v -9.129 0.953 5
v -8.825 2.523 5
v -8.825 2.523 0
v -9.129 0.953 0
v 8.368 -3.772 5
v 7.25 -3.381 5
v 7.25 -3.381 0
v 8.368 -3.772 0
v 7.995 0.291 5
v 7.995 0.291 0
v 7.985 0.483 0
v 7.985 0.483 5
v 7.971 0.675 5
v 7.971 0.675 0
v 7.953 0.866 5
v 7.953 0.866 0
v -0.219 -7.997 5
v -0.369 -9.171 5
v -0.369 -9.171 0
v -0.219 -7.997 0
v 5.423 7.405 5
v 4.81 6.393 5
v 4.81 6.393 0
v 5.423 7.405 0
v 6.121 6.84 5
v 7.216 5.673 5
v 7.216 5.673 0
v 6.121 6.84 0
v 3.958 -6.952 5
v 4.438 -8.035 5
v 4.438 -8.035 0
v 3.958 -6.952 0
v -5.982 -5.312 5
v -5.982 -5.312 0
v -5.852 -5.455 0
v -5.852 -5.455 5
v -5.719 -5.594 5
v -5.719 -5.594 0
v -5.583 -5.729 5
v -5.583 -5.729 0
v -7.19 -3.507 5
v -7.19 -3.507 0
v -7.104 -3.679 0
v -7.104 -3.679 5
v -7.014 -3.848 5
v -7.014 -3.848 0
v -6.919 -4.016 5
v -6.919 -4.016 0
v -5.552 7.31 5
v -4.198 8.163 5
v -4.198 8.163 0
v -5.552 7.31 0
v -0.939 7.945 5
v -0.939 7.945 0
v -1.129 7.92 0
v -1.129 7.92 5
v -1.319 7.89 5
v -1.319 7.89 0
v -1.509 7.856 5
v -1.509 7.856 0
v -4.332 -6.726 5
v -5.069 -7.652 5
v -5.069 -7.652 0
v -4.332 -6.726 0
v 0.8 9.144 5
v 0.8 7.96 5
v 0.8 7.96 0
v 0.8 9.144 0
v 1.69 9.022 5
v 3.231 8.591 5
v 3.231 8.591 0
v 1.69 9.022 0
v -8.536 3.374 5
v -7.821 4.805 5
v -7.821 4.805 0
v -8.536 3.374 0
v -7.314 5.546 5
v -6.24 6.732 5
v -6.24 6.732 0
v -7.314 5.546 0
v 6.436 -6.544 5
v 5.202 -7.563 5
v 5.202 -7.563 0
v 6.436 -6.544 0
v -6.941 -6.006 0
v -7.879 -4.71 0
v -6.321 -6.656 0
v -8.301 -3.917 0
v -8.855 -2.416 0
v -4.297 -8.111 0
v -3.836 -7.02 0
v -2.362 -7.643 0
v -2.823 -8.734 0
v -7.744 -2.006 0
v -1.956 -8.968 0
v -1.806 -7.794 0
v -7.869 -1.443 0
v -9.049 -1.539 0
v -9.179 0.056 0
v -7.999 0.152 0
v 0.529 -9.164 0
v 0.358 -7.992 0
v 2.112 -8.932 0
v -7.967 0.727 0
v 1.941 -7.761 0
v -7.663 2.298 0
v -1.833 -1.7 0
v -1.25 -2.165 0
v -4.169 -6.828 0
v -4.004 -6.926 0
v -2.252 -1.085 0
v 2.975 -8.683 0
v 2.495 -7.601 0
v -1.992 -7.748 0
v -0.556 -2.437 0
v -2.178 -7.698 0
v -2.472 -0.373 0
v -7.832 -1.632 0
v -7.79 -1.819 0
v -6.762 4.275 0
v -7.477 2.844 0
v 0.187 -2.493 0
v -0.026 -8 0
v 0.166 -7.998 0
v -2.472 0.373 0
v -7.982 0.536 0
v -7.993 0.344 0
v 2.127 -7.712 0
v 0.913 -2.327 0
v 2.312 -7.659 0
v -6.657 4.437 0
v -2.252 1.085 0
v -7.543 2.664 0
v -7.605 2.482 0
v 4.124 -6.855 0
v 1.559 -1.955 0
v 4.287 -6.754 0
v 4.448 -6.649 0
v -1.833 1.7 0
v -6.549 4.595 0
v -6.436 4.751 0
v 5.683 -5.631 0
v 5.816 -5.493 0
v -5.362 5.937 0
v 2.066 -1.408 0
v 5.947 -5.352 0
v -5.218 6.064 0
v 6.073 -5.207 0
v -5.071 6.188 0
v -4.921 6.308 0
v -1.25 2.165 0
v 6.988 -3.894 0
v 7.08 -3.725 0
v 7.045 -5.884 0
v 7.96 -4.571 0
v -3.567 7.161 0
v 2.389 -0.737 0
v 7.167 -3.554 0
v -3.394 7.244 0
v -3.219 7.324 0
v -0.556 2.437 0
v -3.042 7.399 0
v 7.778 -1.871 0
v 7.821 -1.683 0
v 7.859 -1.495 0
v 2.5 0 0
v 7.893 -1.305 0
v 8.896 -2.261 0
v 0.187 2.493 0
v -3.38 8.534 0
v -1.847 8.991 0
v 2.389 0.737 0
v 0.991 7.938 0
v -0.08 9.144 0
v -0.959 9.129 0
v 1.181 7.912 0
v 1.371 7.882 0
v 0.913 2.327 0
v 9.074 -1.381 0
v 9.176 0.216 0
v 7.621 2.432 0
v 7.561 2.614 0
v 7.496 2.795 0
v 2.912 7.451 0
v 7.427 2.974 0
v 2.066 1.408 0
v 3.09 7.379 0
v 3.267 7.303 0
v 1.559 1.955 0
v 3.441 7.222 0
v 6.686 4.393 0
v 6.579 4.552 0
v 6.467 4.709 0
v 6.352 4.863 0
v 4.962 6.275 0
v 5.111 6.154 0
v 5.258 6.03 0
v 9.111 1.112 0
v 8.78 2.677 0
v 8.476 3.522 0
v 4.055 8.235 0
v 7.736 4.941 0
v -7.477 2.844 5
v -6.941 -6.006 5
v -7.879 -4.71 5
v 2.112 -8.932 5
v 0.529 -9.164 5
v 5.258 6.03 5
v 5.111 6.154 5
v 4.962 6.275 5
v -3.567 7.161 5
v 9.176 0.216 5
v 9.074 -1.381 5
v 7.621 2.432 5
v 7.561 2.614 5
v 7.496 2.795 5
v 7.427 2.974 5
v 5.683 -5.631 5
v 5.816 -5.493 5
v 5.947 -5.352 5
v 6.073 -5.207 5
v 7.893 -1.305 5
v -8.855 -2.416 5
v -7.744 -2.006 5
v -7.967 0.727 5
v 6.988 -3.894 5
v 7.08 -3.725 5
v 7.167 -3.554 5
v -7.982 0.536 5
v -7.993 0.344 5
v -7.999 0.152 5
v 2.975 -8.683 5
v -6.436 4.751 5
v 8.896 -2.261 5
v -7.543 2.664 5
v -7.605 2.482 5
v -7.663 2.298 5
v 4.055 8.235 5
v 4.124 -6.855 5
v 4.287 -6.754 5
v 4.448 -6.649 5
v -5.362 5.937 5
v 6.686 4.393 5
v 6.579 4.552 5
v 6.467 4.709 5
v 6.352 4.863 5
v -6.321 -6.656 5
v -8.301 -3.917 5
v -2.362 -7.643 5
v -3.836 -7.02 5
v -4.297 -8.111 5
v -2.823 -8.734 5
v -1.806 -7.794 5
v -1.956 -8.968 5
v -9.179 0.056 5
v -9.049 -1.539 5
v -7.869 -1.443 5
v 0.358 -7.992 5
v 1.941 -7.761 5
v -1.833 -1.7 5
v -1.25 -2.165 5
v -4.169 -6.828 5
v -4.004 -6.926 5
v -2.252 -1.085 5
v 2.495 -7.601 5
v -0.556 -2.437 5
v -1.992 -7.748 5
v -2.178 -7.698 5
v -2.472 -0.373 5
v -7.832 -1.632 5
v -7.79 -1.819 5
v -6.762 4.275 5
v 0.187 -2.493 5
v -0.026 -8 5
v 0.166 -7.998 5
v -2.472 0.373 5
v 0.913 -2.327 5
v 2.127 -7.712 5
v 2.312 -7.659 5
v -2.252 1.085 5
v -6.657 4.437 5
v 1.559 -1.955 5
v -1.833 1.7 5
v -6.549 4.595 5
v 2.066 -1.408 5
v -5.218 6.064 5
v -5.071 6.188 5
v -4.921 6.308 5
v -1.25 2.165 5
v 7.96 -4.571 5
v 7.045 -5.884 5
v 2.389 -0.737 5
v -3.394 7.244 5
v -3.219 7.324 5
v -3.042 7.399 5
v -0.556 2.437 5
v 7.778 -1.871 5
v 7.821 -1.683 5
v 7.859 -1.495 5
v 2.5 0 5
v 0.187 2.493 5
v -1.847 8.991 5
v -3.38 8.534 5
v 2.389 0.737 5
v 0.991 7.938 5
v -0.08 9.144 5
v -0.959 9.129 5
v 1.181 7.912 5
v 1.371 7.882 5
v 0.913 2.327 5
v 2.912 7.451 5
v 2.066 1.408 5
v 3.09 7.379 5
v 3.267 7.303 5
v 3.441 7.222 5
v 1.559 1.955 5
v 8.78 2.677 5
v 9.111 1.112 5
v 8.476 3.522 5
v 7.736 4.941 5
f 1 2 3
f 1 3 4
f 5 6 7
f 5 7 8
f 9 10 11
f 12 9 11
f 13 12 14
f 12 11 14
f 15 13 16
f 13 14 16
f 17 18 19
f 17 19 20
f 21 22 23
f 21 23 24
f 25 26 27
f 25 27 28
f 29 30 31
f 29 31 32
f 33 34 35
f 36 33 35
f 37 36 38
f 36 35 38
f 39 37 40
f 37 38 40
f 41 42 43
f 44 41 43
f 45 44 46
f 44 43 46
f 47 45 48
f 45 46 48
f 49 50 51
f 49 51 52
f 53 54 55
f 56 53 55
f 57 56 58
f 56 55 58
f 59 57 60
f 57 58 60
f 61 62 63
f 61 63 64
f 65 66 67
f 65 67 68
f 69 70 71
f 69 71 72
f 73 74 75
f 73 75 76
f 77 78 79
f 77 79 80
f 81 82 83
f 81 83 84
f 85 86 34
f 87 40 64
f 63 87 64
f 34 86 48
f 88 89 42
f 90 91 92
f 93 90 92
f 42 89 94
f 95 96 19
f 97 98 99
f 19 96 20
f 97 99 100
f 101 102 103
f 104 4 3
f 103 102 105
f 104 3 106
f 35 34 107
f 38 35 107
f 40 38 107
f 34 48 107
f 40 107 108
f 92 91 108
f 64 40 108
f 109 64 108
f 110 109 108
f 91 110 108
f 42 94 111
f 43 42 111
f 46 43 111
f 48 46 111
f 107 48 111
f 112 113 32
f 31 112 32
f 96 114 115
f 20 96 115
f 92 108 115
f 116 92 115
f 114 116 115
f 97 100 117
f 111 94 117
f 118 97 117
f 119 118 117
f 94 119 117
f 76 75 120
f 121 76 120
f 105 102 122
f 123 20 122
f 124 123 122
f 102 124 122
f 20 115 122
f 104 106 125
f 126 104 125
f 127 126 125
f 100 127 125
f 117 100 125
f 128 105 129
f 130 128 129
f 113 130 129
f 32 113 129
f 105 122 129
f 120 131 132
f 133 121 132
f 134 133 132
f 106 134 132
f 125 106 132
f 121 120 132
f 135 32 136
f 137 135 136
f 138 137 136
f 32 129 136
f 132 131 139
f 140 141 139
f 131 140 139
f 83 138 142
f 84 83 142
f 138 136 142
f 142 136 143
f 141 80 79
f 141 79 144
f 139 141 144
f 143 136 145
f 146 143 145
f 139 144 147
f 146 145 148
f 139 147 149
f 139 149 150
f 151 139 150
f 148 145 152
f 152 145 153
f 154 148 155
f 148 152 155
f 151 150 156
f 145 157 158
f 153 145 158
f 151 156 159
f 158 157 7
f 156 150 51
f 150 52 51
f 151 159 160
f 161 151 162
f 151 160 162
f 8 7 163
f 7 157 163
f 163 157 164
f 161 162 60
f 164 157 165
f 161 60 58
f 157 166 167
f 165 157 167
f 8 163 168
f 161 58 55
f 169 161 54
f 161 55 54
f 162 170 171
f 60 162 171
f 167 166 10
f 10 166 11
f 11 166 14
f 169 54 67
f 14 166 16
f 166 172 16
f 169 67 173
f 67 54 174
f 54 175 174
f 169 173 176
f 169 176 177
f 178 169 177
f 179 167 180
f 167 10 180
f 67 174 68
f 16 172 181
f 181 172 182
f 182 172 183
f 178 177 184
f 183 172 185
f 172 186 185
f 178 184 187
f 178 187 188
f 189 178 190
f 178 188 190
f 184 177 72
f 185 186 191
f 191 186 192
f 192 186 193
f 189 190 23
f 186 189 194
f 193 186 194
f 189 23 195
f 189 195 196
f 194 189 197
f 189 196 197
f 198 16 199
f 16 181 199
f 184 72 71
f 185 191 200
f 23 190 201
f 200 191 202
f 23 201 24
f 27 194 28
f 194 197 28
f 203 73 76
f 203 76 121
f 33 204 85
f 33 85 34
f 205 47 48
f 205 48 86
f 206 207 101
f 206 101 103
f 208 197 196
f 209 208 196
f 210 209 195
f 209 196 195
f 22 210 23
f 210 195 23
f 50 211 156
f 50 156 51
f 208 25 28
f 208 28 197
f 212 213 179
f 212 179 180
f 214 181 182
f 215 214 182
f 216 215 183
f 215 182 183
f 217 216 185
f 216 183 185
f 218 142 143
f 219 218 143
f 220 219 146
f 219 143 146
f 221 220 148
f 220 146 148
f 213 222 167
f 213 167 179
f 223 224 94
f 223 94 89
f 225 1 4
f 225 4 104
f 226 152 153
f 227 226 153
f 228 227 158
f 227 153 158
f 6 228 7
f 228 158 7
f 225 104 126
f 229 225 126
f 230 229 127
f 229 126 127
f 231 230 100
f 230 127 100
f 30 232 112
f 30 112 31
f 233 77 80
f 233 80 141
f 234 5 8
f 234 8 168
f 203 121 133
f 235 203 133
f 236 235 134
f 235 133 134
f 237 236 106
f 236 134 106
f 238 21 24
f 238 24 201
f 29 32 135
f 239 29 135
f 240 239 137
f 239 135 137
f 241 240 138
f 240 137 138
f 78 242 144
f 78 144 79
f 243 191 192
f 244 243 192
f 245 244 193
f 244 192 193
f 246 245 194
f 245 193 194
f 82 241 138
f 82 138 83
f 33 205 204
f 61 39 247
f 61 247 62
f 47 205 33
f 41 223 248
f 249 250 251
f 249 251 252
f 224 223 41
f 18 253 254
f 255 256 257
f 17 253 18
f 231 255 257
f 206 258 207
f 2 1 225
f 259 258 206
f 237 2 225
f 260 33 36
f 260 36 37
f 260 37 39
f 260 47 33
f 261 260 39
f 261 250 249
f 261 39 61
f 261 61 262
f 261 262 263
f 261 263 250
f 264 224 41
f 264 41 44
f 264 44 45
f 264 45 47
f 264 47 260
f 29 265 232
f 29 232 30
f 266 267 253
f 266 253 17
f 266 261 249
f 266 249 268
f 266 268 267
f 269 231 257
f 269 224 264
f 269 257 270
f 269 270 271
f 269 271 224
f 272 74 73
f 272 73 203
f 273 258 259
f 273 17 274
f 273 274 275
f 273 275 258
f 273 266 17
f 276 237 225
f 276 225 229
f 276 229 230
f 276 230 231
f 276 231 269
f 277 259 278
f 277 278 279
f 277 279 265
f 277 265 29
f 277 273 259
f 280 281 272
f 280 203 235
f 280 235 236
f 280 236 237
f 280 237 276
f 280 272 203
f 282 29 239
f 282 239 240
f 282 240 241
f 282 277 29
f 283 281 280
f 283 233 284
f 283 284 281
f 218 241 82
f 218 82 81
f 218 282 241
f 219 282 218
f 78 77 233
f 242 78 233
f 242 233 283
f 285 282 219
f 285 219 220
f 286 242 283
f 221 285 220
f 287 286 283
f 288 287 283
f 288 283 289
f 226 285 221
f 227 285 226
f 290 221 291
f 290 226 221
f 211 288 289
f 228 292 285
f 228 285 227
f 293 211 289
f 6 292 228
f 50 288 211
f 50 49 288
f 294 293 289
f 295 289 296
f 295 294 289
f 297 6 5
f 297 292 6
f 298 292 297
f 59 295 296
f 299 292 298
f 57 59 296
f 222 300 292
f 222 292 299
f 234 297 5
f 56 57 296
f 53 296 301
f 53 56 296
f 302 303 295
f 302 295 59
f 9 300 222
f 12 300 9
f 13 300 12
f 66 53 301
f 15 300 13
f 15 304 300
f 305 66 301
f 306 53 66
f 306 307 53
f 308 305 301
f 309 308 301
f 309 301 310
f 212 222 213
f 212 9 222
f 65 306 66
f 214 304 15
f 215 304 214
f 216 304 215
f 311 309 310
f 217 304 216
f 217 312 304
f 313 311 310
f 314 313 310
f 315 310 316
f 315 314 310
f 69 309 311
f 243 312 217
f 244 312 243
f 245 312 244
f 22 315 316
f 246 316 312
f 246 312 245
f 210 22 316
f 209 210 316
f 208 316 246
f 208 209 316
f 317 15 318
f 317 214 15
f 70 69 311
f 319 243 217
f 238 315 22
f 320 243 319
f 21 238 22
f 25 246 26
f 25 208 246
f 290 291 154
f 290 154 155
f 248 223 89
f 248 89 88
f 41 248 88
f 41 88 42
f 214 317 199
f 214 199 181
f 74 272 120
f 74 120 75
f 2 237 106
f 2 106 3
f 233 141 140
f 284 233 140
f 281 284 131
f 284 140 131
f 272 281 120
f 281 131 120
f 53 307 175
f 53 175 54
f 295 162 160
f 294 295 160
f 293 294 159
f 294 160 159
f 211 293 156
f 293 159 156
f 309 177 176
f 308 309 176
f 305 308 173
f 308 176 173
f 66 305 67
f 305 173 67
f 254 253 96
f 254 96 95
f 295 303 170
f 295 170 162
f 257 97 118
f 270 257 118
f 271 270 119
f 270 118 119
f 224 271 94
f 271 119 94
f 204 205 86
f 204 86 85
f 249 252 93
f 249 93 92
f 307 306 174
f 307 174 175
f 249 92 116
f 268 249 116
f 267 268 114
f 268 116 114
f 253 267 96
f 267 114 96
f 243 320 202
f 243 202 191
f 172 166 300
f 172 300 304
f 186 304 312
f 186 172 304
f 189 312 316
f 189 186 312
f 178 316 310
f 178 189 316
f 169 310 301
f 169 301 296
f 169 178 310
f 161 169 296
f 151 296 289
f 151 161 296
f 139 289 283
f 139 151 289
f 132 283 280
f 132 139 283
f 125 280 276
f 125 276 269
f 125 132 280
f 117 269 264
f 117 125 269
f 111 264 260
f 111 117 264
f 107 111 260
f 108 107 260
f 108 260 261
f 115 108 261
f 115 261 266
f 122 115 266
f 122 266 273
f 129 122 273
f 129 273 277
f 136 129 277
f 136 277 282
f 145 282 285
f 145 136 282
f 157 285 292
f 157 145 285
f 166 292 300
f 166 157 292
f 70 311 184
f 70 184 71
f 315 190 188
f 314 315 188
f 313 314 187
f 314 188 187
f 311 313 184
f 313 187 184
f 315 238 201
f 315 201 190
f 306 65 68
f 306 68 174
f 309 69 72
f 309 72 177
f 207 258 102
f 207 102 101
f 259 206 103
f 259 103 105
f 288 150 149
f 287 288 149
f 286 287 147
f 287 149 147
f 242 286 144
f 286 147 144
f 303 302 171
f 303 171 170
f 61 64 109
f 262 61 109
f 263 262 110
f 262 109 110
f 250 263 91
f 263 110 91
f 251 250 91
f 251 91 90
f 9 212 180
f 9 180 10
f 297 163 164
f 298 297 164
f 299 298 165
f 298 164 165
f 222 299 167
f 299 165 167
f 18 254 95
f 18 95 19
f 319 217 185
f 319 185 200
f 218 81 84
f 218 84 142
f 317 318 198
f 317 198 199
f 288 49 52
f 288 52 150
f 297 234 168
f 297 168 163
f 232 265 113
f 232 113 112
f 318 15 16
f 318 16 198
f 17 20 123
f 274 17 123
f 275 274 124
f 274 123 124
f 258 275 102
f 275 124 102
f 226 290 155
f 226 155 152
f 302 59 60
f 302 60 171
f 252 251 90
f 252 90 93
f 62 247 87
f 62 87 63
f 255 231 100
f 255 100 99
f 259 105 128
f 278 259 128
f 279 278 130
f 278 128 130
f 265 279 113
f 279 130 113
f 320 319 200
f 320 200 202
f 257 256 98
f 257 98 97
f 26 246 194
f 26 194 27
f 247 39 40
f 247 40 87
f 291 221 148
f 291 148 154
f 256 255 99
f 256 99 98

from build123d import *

# Parameters (mm, degrees)
F0_R     = 8
F0_R_2   = 2.5
F1_DEPTH = 5
F3_DEPTH = 5


with BuildPart() as f1:
    # F0 (on Top) → F1 (new body)
    with BuildSketch(Plane.XY):
        Circle(F0_R)
        Circle(F0_R_2, mode=Mode.SUBTRACT)
    extrude(amount=F1_DEPTH)

    # F2 (on face) → F3 (join)
    with BuildSketch(Plane.XY.offset(5)):
        with BuildLine():
            ThreePointArc((-7.4773131729, 2.8442552126), (-7.1554071491, 3.5777295217), (-6.7617672686, 4.2753366424))
            Line((-6.7617672686, 4.2753366424), (-7.8207838354, 4.8048487661))
            Line((-7.8207838354, 4.8048487661), (-8.5363297397, 3.3737673363))
            Line((-8.5363297397, 3.3737673363), (-7.4773131729, 2.8442552126))
        make_face()
        with BuildLine():
            ThreePointArc((-7.9668552487, 0.7274733306), (-7.8541735526, 1.5205123497), (-7.6627527787, 2.2983080412))
            Line((-7.6627527787, 2.2983080412), (-8.8251883659, 2.5233473345))
            Line((-8.8251883659, 2.5233473345), (-9.1292908359, 0.952512624))
            Line((-9.1292908359, 0.952512624), (-7.9668552487, 0.7274733306))
        make_face()
        with BuildLine():
            ThreePointArc((-7.8687898433, -1.4429644491), (-7.9736434843, -0.6488525148), (-7.9985603463, 0.1517642477))
            Line((-7.9985603463, 0.1517642477), (-9.1786777557, 0.0557325966))
            Line((-9.1786777557, 0.0557325966), (-9.0489072527, -1.5389961002))
            Line((-9.0489072527, -1.5389961002), (-7.8687898433, -1.4429644491))
        make_face()
        with BuildLine():
            ThreePointArc((-7.1903499195, -3.5069741995), (-7.5050052582, -2.7703602788), (-7.7444219752, -2.0059731478))
            Line((-7.7444219752, -2.0059731478), (-8.855179859, -2.4159927833))
            Line((-8.855179859, -2.4159927833), (-8.3011078033, -3.916993835))
            Line((-8.3011078033, -3.916993835), (-7.1903499195, -3.5069741995))
        make_face()
        with BuildLine():
            ThreePointArc((-5.9815748417, -5.3123217535), (-6.482823997, -4.6875359225), (-6.9190820262, -4.0157569542))
            Line((-6.9190820262, -4.0157569542), (-7.8785547535, -4.7095229546))
            Line((-7.8785547535, -4.7095229546), (-6.941047569, -6.006087754))
            Line((-6.941047569, -6.006087754), (-5.9815748417, -5.3123217535))
        make_face()
        with BuildLine():
            ThreePointArc((-4.3316196476, -6.7258509669), (-4.9824922283, -6.2589752512), (-5.5834146978, -5.7293525212))
            Line((-5.5834146978, -5.7293525212), (-6.3208349038, -6.655695124))
            Line((-6.3208349038, -6.655695124), (-5.0690398536, -7.6521935697))
            Line((-5.0690398536, -7.6521935697), (-4.3316196476, -6.7258509669))
        make_face()
        with BuildLine():
            ThreePointArc((-2.3621792826, -7.6433048505), (-3.1146691954, -7.3687743759), (-3.8359341578, -7.0203710114))
            Line((-3.8359341578, -7.0203710114), (-4.2969122977, -8.1109664141))
            Line((-4.2969122977, -8.1109664141), (-2.8231574225, -8.7339002532))
            Line((-2.8231574225, -8.7339002532), (-2.3621792826, -7.6433048505))
        make_face()
        with BuildLine():
            ThreePointArc((-0.2185128052, -7.9970152028), (-1.0171190163, -7.9350783806), (-1.8055284813, -7.7935913996))
            Line((-1.8055284813, -7.7935913996), (-1.956064414, -8.9680010857))
            Line((-1.956064414, -8.9680010857), (-0.3690487378, -9.171424889))
            Line((-0.3690487378, -9.171424889), (-0.2185128052, -7.9970152028))
        make_face()
        with BuildLine():
            Line((2.1122796957, -8.9324971845), (1.9412704153, -7.7608935809))
            ThreePointArc((1.9412704153, -7.7608935809), (1.1554503171, -7.9161186553), (0.3580466842, -7.9919836444))
            Line((0.3580466842, -7.9919836444), (0.5290559647, -9.163587248))
            Line((0.5290559647, -9.163587248), (2.1122796957, -8.9324971845))
        make_face()
        with BuildLine():
            Line((4.4378137396, -8.0347396148), (3.9578722946, -6.9523554929))
            ThreePointArc((3.9578722946, -6.9523554929), (3.2427976615, -7.3132936032), (2.495213574, -7.6009150252))
            Line((2.495213574, -7.6009150252), (2.975155019, -8.6832991471))
            Line((2.975155019, -8.6832991471), (4.4378137396, -8.0347396148))
        make_face()
        with BuildLine():
            Line((6.4360301064, -6.5443676496), (5.6825553055, -5.6310358905))
            ThreePointArc((5.6825553055, -5.6310358905), (5.0909675506, -6.1710654995), (4.4483422056, -6.6492294006))
            Line((4.4483422056, -6.6492294006), (5.2018170066, -7.5625611597))
            Line((5.2018170066, -7.5625611597), (6.4360301064, -6.5443676496))
        make_face()
        with BuildLine():
            Line((7.9595473202, -4.5713059318), (6.988112839, -3.8943907032))
            ThreePointArc((6.988112839, -3.8943907032), (6.5636454136, -4.5736811088), (6.0733766172, -5.2071197859))
            Line((6.0733766172, -5.2071197859), (7.0448110985, -5.8840350145))
            Line((7.0448110985, -5.8840350145), (7.9595473202, -4.5713059318))
        make_face()
        with BuildLine():
            Line((8.8959960602, -2.261080618), (7.7782515209, -1.8705088285))
            ThreePointArc((7.7782515209, -1.8705088285), (7.5522116631, -2.6389579374), (7.2504599334, -3.3809511611))
            Line((7.2504599334, -3.3809511611), (8.3682044728, -3.7715229506))
            Line((8.3682044728, -3.7715229506), (8.8959960602, -2.261080618))
        make_face()
        with BuildLine():
            Line((9.1763071307, 0.215914123), (7.9946934755, 0.2913352594))
            ThreePointArc((7.9946934755, 0.2913352594), (7.9986732589, 0.1456917916), (8, 0))
            ThreePointArc((8, 0), (7.9731485852, -0.6549058236), (7.8927745906, -1.3054153602))
            Line((7.8927745906, -1.3054153602), (9.0743882458, -1.3808364965))
            Line((9.0743882458, -1.3808364965), (9.1763071307, 0.215914123))
        make_face()
        with BuildLine():
            Line((8.7798057637, 2.6769837907), (7.6214746983, 2.4316914736))
            ThreePointArc((7.6214746983, 2.4316914736), (7.8264407244, 1.6573549974), (7.9529456978, 0.8664033288))
            Line((7.9529456978, 0.8664033288), (9.1112767632, 1.1116956459))
            Line((9.1112767632, 1.1116956459), (8.7798057637, 2.6769837907))
        make_face()
        with BuildLine():
            Line((7.7357365186, 4.9406084625), (6.6861225059, 4.3926945985))
            ThreePointArc((6.6861225059, 4.3926945985), (7.0918773562, 3.70206369), (7.4265352439, 2.9743191273))
            Line((7.4265352439, 2.9743191273), (8.4761492566, 3.5222329912))
            Line((8.4761492566, 3.5222329912), (7.7357365186, 4.9406084625))
        make_face()
        with BuildLine():
            Line((6.1211063045, 6.8398310705), (5.2576252165, 6.029707877))
            ThreePointArc((5.2576252165, 6.029707877), (5.8342418272, 5.4737210654), (6.3523694296, 4.8628595116))
            Line((6.3523694296, 4.8628595116), (7.2158505176, 5.6729827051))
            Line((7.2158505176, 5.6729827051), (6.1211063045, 6.8398310705))
        make_face()
        with BuildLine():
            Line((4.0550046196, 8.2345715735), (3.4413438124, 7.2219909142))
            ThreePointArc((3.4413438124, 7.2219909142), (4.1462929515, 6.8416558493), (4.8096749823, 6.3927323239))
            Line((4.8096749823, 6.3927323239), (5.4233357894, 7.4053129832))
            Line((5.4233357894, 7.4053129832), (4.0550046196, 8.2345715735))
        make_face()
        with BuildLine():
            Line((1.6898199243, 9.0219587722), (1.3712408807, 7.8816050679))
            ThreePointArc((1.3712408807, 7.8816050679), (2.1525279564, 7.7049739388), (2.9122356685, 7.4510994767))
            Line((2.9122356685, 7.4510994767), (3.2308147121, 8.591453181))
            Line((3.2308147121, 8.591453181), (1.6898199243, 9.0219587722))
        make_face()
        with BuildLine():
            Line((0.8, 9.1439177306), (-0.0797977611, 9.1439177306))
            Line((-0.0797977611, 9.1439177306), (-0.9594615248, 9.1285631425))
            Line((-0.9594615248, 9.1285631425), (-0.9387975573, 7.9447252405))
            ThreePointArc((-0.9387975573, 7.9447252405), (-0.069812284, 7.9996953845), (0.8, 7.9598994969))
            Line((0.8, 7.9598994969), (0.8, 9.1439177306))
        make_face()
        with BuildLine():
            ThreePointArc((-4.9205110082, 6.3078182772), (-4.2650648096, 6.7682510422), (-3.5668607998, 7.1608312391))
            Line((-3.5668607998, 7.1608312391), (-4.1981001127, 8.1625478197))
            Line((-4.1981001127, 8.1625478197), (-5.5517503211, 7.3095348578))
            Line((-5.5517503211, 7.3095348578), (-4.9205110082, 6.3078182772))
        make_face()
        with BuildLine():
            ThreePointArc((-6.4362705336, 4.7512547414), (-5.9288828486, 5.3710658316), (-5.3620573673, 5.9370313111))
            Line((-5.3620573673, 5.9370313111), (-6.2395455422, 6.7319612961))
            Line((-6.2395455422, 6.7319612961), (-7.3137587085, 5.5461847263))
            Line((-7.3137587085, 5.5461847263), (-6.4362705336, 4.7512547414))
        make_face()
        with BuildLine():
            ThreePointArc((-3.0418317373, 7.3991391176), (-2.2866704527, 7.6662336412), (-1.5085850091, 7.8564732081))
            Line((-1.5085850091, 7.8564732081), (-1.8470174479, 8.9910932601))
            Line((-1.8470174479, 8.9910932601), (-3.3802641762, 8.5337591696))
            Line((-3.3802641762, 8.5337591696), (-3.0418317373, 7.3991391176))
        make_face()
    extrude(amount=-F3_DEPTH)


solid = f1.part
